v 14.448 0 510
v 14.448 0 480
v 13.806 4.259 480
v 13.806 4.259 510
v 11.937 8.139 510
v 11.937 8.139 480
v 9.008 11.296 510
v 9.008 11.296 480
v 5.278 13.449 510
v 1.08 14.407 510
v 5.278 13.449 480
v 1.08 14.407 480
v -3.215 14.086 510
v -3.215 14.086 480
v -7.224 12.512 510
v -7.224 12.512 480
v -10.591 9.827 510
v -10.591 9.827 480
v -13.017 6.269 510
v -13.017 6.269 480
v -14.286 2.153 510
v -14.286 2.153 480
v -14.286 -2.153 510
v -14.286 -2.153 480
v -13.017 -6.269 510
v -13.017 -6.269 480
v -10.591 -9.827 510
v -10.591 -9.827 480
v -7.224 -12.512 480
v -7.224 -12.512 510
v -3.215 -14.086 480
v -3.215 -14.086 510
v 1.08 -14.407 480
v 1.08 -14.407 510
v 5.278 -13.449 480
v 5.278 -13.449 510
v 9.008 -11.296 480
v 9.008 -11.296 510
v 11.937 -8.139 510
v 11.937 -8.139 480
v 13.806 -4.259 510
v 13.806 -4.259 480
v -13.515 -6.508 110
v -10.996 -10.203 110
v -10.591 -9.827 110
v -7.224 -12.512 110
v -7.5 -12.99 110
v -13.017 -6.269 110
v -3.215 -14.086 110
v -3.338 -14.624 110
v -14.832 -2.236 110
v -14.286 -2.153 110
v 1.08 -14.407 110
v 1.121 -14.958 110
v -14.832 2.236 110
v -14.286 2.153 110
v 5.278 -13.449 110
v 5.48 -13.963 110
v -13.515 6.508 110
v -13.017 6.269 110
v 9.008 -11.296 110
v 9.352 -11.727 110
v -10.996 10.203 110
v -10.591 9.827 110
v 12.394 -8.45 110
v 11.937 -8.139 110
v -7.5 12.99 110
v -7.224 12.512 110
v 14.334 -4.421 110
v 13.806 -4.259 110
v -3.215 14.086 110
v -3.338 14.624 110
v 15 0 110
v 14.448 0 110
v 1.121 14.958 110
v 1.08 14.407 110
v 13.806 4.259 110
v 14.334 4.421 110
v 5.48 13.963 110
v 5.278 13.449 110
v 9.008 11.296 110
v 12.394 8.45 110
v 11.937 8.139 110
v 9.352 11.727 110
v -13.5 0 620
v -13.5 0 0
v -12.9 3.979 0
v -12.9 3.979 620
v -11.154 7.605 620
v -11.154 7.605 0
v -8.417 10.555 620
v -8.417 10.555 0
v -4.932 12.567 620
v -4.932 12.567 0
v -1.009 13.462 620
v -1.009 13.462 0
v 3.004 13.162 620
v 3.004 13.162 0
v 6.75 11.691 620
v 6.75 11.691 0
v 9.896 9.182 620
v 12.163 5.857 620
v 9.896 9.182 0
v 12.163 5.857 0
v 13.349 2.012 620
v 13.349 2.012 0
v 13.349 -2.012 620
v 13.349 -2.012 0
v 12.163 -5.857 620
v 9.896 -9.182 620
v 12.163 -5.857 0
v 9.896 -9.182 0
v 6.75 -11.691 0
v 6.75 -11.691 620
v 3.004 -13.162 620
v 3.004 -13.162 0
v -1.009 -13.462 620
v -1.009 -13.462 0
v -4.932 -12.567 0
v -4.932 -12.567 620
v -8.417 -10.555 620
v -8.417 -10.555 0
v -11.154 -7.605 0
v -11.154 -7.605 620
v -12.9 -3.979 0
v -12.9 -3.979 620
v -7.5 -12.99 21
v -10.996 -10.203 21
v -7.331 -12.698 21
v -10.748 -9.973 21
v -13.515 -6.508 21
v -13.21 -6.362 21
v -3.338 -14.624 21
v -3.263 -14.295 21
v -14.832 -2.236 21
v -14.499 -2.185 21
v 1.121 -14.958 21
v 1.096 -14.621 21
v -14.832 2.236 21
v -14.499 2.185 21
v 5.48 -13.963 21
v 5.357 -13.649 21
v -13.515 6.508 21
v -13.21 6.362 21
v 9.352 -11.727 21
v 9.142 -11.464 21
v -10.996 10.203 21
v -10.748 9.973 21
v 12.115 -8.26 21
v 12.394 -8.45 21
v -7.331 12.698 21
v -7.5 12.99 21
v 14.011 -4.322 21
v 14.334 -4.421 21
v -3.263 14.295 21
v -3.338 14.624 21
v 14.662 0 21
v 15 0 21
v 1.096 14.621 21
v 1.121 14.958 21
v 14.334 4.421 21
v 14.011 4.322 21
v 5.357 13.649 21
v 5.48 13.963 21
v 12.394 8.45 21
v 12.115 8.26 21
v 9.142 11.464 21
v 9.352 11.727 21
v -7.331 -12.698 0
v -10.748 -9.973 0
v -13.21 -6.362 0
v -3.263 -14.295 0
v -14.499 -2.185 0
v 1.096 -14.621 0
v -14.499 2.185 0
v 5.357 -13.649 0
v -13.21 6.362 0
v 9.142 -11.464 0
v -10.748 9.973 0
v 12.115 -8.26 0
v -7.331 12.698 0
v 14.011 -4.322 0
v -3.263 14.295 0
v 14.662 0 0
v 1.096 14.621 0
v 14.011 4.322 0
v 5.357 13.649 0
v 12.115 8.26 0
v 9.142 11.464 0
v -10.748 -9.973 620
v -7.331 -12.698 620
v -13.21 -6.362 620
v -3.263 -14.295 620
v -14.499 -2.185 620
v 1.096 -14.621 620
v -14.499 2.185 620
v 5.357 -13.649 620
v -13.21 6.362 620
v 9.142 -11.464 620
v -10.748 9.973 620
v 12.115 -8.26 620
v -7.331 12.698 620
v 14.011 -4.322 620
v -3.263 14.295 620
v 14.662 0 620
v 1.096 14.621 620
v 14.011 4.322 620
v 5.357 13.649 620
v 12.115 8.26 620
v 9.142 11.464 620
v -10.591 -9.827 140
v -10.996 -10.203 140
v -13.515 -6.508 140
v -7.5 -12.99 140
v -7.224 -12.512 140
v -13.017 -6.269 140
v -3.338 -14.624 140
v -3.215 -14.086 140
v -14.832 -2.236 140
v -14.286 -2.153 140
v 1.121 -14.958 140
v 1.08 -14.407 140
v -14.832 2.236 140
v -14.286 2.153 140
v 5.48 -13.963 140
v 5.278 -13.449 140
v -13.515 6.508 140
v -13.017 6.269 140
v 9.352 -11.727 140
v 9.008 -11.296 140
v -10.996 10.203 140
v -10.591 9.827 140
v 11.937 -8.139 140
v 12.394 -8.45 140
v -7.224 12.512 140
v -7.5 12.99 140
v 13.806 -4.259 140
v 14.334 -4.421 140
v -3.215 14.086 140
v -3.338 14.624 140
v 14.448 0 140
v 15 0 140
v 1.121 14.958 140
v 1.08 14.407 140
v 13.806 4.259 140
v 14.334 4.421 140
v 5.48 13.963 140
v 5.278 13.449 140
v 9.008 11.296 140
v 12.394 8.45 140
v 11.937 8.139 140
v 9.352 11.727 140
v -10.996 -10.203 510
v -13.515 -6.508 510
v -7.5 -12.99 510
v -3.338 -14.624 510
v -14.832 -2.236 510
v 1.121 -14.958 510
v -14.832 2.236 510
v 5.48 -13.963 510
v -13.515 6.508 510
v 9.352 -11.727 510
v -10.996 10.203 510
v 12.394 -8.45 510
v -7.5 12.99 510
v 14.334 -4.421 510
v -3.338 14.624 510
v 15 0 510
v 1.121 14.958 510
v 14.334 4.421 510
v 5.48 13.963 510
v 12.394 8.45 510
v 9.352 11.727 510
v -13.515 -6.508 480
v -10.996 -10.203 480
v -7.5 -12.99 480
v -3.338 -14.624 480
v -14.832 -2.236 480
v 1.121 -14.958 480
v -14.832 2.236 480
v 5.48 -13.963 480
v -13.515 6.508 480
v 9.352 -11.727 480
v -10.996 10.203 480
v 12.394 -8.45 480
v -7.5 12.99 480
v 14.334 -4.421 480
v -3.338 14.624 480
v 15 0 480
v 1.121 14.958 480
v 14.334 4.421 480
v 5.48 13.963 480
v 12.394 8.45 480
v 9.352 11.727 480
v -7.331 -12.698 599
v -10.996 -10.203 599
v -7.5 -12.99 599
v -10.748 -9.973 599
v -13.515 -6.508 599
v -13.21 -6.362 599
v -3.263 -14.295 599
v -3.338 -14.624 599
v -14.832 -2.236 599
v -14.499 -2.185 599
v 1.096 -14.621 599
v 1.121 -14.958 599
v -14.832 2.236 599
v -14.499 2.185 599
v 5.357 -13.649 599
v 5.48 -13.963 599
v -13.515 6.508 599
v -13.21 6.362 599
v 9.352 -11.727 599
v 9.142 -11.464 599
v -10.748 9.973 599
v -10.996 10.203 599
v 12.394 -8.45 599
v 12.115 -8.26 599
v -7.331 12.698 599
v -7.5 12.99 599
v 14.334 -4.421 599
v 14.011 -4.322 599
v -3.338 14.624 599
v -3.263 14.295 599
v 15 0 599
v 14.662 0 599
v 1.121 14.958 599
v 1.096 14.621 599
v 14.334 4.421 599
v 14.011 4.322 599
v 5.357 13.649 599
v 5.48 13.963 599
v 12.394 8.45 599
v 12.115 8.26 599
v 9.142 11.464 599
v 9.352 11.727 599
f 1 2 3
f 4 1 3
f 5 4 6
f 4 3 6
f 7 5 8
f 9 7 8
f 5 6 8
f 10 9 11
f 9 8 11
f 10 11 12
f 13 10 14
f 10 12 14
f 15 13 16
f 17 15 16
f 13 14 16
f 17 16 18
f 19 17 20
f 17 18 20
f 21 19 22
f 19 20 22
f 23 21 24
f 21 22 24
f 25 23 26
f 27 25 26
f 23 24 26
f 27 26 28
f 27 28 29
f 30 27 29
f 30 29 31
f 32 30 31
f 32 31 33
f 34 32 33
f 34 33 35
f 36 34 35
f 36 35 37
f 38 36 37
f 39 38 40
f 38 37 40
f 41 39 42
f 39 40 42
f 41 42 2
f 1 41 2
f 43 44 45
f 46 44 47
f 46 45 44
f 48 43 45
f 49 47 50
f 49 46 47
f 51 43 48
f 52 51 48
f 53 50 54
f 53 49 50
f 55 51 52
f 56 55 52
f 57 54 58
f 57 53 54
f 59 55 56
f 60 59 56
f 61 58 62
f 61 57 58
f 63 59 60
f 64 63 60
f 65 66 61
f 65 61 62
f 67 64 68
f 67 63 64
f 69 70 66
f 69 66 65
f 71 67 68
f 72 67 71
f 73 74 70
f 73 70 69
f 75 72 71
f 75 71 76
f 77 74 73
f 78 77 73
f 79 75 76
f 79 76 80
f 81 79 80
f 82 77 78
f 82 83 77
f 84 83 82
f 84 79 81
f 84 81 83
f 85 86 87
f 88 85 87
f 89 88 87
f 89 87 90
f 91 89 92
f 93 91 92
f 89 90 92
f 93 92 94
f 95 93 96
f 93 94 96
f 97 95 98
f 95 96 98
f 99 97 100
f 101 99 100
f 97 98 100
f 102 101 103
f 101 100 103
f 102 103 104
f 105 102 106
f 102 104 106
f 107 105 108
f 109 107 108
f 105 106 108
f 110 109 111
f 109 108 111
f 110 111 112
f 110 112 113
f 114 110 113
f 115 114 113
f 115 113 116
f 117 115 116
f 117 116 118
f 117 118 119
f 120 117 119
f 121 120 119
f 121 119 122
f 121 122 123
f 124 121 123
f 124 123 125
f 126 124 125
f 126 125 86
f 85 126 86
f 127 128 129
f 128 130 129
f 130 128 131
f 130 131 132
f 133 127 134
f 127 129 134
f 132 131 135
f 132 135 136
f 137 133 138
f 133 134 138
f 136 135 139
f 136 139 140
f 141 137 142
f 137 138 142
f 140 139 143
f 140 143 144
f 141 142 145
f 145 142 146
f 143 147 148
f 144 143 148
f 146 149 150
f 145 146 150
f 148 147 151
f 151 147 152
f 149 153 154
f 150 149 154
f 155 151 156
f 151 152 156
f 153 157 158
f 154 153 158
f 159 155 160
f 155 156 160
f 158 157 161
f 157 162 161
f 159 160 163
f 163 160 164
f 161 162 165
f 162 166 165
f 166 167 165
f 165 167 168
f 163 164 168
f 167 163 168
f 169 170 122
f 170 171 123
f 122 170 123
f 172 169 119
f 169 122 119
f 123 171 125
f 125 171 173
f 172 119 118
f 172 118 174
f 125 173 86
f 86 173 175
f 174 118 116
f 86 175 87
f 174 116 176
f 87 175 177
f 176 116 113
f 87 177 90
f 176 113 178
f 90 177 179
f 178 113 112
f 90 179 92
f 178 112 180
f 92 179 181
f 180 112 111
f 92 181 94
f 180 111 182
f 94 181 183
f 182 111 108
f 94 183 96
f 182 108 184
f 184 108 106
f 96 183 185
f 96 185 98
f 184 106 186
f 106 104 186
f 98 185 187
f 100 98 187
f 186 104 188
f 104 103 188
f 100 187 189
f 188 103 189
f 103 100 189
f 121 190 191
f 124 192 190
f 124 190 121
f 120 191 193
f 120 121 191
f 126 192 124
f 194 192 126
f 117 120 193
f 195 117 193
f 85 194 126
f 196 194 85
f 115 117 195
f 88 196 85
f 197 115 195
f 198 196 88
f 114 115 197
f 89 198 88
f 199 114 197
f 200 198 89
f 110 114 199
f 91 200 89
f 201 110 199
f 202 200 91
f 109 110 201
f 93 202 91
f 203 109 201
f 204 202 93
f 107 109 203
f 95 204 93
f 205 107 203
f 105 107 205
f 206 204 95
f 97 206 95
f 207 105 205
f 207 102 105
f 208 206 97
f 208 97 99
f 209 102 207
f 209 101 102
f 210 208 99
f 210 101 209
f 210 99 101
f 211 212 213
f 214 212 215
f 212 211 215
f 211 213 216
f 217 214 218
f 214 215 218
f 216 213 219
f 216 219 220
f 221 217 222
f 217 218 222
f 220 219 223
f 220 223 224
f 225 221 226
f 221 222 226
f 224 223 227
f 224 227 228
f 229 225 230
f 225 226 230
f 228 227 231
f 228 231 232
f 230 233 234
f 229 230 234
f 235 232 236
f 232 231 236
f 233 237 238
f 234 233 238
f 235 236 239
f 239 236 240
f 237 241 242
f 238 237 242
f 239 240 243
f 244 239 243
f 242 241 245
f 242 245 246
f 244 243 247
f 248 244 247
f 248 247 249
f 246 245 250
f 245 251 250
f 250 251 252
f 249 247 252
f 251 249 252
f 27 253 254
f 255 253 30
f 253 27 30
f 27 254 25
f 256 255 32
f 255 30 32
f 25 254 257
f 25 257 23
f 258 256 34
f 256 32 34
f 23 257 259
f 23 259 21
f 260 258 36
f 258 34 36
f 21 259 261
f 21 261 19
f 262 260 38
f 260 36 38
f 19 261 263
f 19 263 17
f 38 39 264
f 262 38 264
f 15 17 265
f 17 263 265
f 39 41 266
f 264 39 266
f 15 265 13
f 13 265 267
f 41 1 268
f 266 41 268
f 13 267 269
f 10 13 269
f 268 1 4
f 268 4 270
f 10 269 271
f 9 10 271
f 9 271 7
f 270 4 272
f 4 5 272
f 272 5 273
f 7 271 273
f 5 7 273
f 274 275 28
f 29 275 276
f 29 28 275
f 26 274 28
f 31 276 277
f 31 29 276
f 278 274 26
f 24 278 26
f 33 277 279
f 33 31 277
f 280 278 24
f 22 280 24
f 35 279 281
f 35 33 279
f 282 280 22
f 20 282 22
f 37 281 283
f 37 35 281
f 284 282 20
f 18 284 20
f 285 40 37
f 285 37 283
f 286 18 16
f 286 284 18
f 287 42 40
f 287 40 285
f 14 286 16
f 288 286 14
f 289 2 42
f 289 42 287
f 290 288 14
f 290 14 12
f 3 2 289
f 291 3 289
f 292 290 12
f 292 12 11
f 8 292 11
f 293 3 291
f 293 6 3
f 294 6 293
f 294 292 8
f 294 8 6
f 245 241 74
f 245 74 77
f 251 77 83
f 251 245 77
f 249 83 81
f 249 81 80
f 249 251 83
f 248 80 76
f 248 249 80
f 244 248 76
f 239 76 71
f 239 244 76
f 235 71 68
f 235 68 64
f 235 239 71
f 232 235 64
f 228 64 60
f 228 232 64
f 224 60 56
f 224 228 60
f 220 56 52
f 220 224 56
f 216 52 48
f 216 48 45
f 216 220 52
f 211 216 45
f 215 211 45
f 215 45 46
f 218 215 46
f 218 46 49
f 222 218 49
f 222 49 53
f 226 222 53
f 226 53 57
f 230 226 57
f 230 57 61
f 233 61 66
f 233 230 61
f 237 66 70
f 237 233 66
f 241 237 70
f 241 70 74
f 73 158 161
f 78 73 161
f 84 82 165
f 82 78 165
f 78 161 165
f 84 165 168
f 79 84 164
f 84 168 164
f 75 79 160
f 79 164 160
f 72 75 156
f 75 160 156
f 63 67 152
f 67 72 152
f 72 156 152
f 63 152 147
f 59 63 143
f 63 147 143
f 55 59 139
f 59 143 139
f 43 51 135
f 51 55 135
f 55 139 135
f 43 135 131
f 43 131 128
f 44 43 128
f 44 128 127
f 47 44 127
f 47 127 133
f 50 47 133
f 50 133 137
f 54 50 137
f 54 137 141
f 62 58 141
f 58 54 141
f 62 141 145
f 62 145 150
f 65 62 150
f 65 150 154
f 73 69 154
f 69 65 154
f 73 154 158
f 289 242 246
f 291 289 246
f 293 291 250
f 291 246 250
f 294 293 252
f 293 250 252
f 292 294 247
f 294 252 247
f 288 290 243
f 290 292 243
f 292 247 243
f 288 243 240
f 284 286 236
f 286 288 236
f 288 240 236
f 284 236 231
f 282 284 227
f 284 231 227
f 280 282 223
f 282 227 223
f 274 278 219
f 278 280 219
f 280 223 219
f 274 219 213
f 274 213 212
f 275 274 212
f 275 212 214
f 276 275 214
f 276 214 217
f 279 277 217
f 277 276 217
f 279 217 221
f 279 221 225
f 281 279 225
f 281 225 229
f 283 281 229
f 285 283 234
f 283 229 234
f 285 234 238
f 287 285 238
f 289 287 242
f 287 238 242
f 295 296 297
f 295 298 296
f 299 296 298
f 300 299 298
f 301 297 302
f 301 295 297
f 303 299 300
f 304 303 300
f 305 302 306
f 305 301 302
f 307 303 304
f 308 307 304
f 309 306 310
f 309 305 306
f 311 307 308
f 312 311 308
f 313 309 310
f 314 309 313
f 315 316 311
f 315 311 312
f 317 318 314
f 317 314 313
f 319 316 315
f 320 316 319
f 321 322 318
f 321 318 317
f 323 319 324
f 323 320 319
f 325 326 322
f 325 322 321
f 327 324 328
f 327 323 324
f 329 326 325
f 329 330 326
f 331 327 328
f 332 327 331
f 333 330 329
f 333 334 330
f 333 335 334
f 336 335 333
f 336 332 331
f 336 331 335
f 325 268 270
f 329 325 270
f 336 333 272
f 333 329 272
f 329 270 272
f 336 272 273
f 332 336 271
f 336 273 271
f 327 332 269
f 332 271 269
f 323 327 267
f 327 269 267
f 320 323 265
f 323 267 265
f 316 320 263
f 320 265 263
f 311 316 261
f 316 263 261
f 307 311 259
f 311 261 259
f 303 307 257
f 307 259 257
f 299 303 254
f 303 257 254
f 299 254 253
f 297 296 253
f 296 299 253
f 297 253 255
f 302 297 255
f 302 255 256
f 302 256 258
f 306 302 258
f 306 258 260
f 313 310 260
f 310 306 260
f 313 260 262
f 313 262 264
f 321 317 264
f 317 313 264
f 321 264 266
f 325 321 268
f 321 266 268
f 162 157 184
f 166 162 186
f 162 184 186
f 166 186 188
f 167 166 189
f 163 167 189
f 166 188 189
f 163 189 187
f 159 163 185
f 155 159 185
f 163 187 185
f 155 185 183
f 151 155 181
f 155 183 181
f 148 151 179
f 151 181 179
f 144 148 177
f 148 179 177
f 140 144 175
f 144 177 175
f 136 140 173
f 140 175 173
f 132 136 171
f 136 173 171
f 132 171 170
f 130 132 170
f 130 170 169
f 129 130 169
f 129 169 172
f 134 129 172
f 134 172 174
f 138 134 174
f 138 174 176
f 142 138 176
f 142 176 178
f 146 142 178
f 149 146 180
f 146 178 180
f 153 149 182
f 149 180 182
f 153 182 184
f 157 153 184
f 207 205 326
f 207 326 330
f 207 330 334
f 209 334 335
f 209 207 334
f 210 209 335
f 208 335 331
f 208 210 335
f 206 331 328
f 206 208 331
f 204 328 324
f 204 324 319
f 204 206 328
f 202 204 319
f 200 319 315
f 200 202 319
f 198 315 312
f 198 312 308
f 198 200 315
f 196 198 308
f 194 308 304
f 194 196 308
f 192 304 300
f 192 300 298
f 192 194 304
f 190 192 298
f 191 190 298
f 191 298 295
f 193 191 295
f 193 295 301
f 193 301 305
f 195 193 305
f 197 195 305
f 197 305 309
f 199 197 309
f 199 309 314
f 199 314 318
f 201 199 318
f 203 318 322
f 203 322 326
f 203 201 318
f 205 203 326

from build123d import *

# Parameters (mm, degrees)
SKETCH1_R           = 15
BOSS_EXTRUDE1_DEPTH = 620
SKETCH2_R           = 13.5
CUT_EXTRUDE1_DEPTH  = 621.362797079
SKETCH4_R           = 16.267367871
SKETCH4_R_2         = 14.447843326
CUT_EXTRUDE2_DEPTH  = 30
SKETCH5_R           = 16.193324777
SKETCH5_R_2         = 14.662495413
CUT_EXTRUDE3_DEPTH  = 21


with BuildPart() as part:
    # Sketch1 → Boss-Extrude1 (new body)
    with BuildSketch(Plane.XY):
        Circle(SKETCH1_R)
    extrude(amount=BOSS_EXTRUDE1_DEPTH)

    # Sketch2 → Cut-Extrude1 (cut, through all)
    with BuildSketch(Plane(origin=(0, 0, 0), x_dir=(-1, 0, 0), z_dir=(0, 0, -1))):
        Circle(SKETCH2_R)
    extrude(amount=-CUT_EXTRUDE1_DEPTH, mode=Mode.SUBTRACT)

    # Sketch4 → Cut-Extrude2 (cut)
    with BuildSketch(Plane.XY.offset(480)):
        Circle(SKETCH4_R)
        Circle(SKETCH4_R_2, mode=Mode.SUBTRACT)
    cut_extrude2 = extrude(amount=CUT_EXTRUDE2_DEPTH, mode=Mode.SUBTRACT)

    # Mirror1: Cut-Extrude2 across plane
    add(cut_extrude2.mirror(Plane.XY.offset(310)), mode=Mode.SUBTRACT)

    # Sketch5 → Cut-Extrude3 (cut)
    with BuildSketch(Plane.XY.offset(620)):
        Circle(SKETCH5_R)
        Circle(SKETCH5_R_2, mode=Mode.SUBTRACT)
    cut_extrude3 = extrude(amount=-CUT_EXTRUDE3_DEPTH, mode=Mode.SUBTRACT)

    # Mirror2: Cut-Extrude3 across plane
    add(cut_extrude3.mirror(Plane.XY.offset(310)), mode=Mode.SUBTRACT)


solid = part.part
